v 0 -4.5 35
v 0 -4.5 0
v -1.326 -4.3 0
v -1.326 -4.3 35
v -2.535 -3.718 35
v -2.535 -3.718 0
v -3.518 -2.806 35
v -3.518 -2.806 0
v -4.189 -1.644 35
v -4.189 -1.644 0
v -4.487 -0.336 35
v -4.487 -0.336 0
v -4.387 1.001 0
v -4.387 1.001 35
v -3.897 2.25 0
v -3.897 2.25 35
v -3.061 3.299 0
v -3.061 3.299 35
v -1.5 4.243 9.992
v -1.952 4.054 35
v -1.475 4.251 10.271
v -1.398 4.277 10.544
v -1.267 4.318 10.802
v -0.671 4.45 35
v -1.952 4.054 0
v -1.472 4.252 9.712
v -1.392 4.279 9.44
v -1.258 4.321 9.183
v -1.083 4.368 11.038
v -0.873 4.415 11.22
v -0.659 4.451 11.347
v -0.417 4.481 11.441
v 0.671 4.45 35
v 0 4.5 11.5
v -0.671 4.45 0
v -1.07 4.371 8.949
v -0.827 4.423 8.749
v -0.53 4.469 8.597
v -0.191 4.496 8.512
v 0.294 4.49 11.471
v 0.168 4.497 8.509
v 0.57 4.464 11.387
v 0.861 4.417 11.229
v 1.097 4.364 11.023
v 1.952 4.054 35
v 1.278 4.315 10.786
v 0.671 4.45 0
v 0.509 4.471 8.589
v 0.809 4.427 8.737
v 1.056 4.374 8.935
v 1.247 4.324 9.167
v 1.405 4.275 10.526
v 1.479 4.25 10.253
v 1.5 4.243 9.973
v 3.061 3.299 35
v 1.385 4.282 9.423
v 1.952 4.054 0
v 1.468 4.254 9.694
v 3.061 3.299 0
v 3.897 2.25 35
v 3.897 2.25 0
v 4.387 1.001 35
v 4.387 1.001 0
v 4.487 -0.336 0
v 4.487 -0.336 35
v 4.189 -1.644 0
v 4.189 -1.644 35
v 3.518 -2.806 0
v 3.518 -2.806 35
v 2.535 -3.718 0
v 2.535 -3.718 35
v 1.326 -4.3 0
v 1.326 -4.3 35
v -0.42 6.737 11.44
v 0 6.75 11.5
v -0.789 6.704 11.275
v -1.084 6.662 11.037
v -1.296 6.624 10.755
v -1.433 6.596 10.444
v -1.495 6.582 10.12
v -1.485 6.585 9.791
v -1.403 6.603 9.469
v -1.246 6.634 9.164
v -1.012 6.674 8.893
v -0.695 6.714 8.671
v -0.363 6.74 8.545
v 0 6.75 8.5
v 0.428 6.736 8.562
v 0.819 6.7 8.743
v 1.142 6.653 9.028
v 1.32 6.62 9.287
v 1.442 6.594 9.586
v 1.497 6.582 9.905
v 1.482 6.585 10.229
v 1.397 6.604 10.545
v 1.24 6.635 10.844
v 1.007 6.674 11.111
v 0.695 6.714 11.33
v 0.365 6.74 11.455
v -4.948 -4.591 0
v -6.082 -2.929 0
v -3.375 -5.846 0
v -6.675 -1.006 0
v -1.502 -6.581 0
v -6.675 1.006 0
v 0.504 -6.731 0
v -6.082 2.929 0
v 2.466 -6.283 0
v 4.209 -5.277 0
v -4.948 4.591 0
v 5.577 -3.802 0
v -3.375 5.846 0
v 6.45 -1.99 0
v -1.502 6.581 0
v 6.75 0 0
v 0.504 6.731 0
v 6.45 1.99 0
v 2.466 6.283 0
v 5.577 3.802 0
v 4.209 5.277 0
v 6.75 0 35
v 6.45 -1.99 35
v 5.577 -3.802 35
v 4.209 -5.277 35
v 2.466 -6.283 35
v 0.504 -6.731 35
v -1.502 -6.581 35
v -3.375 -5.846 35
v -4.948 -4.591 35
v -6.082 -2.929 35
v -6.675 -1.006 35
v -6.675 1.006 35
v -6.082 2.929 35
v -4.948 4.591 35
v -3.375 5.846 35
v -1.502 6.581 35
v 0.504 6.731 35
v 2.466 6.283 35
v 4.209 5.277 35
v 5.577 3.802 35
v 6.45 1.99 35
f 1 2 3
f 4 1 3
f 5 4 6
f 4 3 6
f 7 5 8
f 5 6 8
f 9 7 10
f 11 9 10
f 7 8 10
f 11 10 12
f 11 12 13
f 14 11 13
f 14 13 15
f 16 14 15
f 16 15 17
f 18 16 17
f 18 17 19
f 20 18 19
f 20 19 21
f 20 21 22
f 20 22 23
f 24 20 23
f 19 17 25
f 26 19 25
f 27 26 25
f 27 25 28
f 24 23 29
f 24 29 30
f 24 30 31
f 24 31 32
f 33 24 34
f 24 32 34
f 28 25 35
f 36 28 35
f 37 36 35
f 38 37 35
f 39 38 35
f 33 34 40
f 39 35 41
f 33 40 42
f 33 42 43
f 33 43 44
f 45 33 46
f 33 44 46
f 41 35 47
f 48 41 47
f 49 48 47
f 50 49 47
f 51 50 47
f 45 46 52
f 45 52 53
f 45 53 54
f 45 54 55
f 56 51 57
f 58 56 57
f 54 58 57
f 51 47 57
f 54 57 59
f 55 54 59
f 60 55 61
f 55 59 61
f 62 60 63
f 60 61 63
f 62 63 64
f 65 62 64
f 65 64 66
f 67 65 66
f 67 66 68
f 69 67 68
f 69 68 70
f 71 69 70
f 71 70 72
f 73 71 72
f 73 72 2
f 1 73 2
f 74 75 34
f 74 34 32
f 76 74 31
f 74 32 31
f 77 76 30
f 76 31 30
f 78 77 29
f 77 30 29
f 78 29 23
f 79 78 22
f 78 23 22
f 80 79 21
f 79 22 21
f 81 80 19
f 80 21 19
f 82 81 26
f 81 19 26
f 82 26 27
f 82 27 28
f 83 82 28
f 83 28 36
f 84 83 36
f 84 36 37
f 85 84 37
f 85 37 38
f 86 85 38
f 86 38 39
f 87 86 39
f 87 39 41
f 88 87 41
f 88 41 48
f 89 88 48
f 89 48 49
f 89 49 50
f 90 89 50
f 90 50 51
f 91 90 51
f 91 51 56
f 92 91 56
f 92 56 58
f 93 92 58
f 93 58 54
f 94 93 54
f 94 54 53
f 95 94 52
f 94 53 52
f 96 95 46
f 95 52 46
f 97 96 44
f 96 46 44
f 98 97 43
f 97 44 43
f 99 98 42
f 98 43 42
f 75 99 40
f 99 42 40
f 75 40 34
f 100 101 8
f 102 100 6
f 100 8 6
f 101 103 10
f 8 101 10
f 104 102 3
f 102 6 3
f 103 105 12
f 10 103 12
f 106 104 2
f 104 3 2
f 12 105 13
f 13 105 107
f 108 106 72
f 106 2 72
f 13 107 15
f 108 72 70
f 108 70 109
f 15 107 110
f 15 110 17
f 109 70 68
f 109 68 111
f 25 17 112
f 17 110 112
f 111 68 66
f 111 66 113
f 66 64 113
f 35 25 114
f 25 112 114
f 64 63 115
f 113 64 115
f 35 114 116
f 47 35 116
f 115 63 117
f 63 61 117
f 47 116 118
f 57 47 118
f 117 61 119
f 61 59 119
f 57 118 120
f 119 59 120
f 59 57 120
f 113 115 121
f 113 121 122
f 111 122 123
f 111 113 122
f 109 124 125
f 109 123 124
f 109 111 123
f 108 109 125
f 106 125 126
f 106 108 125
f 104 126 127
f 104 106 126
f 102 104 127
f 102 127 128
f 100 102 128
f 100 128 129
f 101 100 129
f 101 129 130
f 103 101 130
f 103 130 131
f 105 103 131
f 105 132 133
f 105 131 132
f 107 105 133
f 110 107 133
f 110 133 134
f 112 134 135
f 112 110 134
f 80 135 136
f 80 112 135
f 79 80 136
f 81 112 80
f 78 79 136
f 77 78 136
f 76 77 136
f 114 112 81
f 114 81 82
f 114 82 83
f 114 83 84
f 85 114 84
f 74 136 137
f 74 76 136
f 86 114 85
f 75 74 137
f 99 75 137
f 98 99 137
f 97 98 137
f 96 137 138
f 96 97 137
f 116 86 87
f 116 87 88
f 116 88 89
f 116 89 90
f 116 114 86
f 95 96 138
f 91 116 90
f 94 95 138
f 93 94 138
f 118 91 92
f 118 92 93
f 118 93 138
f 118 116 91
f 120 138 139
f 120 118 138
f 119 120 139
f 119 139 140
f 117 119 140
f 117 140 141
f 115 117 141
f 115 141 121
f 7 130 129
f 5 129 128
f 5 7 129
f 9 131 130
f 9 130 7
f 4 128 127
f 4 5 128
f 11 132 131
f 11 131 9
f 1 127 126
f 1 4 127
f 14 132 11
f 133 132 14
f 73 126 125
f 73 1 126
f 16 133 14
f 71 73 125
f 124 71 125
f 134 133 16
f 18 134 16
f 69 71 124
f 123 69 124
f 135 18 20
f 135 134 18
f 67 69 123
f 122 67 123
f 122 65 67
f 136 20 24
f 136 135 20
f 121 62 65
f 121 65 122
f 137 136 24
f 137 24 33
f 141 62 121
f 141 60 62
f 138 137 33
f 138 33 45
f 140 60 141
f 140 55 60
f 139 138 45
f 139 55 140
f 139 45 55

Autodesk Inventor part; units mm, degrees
ref_plane "YZ Plane" through (0, 0, 0) normal (1, 0, 0) x (0, 1, 0)
ref_plane "XY Plane" through (0, 0, 0) normal (0, 0, 1) x (1, 0, 0)
sketch "Sketch1" plane through (0, 0, 0) normal (0, 0, 1) x (1, 0, 0)
  circle A0 centre (0, 0) radius 6.75
  dimension "d0" = 13.5
extrude "Extrusion1" add sketch "Sketch1" along normal blind 35
sketch "Sketch2" plane through (0, 0, 35) normal (0, 0, 1) x (1, 0, 0)
  point P0 (0, 0)
hole "Hole1" at (0, 0, 35) direction (0, 0, -1) diameter 9 end through all
ref_plane "Work Plane1" through (0, 6.75, 0) normal (0, 1, 0) x (-1, 0, 0)
sketch "Sketch3" plane through (0, 6.75, 0) normal (0, 1, 0) x (-1, 0, 0)
  line L0 (6.75, 0) -> (-6.75, 0) projected
  point P0 (0, 0)
  point P1 (0, 10)
  dimension "d10" = 10
  dimension "d11" = 6.75
hole "Hole2" at (0, 6.75, 10) direction (0, -1, 0) diameter 3 end up to surface
properties part number "HUDSON-1-74"
